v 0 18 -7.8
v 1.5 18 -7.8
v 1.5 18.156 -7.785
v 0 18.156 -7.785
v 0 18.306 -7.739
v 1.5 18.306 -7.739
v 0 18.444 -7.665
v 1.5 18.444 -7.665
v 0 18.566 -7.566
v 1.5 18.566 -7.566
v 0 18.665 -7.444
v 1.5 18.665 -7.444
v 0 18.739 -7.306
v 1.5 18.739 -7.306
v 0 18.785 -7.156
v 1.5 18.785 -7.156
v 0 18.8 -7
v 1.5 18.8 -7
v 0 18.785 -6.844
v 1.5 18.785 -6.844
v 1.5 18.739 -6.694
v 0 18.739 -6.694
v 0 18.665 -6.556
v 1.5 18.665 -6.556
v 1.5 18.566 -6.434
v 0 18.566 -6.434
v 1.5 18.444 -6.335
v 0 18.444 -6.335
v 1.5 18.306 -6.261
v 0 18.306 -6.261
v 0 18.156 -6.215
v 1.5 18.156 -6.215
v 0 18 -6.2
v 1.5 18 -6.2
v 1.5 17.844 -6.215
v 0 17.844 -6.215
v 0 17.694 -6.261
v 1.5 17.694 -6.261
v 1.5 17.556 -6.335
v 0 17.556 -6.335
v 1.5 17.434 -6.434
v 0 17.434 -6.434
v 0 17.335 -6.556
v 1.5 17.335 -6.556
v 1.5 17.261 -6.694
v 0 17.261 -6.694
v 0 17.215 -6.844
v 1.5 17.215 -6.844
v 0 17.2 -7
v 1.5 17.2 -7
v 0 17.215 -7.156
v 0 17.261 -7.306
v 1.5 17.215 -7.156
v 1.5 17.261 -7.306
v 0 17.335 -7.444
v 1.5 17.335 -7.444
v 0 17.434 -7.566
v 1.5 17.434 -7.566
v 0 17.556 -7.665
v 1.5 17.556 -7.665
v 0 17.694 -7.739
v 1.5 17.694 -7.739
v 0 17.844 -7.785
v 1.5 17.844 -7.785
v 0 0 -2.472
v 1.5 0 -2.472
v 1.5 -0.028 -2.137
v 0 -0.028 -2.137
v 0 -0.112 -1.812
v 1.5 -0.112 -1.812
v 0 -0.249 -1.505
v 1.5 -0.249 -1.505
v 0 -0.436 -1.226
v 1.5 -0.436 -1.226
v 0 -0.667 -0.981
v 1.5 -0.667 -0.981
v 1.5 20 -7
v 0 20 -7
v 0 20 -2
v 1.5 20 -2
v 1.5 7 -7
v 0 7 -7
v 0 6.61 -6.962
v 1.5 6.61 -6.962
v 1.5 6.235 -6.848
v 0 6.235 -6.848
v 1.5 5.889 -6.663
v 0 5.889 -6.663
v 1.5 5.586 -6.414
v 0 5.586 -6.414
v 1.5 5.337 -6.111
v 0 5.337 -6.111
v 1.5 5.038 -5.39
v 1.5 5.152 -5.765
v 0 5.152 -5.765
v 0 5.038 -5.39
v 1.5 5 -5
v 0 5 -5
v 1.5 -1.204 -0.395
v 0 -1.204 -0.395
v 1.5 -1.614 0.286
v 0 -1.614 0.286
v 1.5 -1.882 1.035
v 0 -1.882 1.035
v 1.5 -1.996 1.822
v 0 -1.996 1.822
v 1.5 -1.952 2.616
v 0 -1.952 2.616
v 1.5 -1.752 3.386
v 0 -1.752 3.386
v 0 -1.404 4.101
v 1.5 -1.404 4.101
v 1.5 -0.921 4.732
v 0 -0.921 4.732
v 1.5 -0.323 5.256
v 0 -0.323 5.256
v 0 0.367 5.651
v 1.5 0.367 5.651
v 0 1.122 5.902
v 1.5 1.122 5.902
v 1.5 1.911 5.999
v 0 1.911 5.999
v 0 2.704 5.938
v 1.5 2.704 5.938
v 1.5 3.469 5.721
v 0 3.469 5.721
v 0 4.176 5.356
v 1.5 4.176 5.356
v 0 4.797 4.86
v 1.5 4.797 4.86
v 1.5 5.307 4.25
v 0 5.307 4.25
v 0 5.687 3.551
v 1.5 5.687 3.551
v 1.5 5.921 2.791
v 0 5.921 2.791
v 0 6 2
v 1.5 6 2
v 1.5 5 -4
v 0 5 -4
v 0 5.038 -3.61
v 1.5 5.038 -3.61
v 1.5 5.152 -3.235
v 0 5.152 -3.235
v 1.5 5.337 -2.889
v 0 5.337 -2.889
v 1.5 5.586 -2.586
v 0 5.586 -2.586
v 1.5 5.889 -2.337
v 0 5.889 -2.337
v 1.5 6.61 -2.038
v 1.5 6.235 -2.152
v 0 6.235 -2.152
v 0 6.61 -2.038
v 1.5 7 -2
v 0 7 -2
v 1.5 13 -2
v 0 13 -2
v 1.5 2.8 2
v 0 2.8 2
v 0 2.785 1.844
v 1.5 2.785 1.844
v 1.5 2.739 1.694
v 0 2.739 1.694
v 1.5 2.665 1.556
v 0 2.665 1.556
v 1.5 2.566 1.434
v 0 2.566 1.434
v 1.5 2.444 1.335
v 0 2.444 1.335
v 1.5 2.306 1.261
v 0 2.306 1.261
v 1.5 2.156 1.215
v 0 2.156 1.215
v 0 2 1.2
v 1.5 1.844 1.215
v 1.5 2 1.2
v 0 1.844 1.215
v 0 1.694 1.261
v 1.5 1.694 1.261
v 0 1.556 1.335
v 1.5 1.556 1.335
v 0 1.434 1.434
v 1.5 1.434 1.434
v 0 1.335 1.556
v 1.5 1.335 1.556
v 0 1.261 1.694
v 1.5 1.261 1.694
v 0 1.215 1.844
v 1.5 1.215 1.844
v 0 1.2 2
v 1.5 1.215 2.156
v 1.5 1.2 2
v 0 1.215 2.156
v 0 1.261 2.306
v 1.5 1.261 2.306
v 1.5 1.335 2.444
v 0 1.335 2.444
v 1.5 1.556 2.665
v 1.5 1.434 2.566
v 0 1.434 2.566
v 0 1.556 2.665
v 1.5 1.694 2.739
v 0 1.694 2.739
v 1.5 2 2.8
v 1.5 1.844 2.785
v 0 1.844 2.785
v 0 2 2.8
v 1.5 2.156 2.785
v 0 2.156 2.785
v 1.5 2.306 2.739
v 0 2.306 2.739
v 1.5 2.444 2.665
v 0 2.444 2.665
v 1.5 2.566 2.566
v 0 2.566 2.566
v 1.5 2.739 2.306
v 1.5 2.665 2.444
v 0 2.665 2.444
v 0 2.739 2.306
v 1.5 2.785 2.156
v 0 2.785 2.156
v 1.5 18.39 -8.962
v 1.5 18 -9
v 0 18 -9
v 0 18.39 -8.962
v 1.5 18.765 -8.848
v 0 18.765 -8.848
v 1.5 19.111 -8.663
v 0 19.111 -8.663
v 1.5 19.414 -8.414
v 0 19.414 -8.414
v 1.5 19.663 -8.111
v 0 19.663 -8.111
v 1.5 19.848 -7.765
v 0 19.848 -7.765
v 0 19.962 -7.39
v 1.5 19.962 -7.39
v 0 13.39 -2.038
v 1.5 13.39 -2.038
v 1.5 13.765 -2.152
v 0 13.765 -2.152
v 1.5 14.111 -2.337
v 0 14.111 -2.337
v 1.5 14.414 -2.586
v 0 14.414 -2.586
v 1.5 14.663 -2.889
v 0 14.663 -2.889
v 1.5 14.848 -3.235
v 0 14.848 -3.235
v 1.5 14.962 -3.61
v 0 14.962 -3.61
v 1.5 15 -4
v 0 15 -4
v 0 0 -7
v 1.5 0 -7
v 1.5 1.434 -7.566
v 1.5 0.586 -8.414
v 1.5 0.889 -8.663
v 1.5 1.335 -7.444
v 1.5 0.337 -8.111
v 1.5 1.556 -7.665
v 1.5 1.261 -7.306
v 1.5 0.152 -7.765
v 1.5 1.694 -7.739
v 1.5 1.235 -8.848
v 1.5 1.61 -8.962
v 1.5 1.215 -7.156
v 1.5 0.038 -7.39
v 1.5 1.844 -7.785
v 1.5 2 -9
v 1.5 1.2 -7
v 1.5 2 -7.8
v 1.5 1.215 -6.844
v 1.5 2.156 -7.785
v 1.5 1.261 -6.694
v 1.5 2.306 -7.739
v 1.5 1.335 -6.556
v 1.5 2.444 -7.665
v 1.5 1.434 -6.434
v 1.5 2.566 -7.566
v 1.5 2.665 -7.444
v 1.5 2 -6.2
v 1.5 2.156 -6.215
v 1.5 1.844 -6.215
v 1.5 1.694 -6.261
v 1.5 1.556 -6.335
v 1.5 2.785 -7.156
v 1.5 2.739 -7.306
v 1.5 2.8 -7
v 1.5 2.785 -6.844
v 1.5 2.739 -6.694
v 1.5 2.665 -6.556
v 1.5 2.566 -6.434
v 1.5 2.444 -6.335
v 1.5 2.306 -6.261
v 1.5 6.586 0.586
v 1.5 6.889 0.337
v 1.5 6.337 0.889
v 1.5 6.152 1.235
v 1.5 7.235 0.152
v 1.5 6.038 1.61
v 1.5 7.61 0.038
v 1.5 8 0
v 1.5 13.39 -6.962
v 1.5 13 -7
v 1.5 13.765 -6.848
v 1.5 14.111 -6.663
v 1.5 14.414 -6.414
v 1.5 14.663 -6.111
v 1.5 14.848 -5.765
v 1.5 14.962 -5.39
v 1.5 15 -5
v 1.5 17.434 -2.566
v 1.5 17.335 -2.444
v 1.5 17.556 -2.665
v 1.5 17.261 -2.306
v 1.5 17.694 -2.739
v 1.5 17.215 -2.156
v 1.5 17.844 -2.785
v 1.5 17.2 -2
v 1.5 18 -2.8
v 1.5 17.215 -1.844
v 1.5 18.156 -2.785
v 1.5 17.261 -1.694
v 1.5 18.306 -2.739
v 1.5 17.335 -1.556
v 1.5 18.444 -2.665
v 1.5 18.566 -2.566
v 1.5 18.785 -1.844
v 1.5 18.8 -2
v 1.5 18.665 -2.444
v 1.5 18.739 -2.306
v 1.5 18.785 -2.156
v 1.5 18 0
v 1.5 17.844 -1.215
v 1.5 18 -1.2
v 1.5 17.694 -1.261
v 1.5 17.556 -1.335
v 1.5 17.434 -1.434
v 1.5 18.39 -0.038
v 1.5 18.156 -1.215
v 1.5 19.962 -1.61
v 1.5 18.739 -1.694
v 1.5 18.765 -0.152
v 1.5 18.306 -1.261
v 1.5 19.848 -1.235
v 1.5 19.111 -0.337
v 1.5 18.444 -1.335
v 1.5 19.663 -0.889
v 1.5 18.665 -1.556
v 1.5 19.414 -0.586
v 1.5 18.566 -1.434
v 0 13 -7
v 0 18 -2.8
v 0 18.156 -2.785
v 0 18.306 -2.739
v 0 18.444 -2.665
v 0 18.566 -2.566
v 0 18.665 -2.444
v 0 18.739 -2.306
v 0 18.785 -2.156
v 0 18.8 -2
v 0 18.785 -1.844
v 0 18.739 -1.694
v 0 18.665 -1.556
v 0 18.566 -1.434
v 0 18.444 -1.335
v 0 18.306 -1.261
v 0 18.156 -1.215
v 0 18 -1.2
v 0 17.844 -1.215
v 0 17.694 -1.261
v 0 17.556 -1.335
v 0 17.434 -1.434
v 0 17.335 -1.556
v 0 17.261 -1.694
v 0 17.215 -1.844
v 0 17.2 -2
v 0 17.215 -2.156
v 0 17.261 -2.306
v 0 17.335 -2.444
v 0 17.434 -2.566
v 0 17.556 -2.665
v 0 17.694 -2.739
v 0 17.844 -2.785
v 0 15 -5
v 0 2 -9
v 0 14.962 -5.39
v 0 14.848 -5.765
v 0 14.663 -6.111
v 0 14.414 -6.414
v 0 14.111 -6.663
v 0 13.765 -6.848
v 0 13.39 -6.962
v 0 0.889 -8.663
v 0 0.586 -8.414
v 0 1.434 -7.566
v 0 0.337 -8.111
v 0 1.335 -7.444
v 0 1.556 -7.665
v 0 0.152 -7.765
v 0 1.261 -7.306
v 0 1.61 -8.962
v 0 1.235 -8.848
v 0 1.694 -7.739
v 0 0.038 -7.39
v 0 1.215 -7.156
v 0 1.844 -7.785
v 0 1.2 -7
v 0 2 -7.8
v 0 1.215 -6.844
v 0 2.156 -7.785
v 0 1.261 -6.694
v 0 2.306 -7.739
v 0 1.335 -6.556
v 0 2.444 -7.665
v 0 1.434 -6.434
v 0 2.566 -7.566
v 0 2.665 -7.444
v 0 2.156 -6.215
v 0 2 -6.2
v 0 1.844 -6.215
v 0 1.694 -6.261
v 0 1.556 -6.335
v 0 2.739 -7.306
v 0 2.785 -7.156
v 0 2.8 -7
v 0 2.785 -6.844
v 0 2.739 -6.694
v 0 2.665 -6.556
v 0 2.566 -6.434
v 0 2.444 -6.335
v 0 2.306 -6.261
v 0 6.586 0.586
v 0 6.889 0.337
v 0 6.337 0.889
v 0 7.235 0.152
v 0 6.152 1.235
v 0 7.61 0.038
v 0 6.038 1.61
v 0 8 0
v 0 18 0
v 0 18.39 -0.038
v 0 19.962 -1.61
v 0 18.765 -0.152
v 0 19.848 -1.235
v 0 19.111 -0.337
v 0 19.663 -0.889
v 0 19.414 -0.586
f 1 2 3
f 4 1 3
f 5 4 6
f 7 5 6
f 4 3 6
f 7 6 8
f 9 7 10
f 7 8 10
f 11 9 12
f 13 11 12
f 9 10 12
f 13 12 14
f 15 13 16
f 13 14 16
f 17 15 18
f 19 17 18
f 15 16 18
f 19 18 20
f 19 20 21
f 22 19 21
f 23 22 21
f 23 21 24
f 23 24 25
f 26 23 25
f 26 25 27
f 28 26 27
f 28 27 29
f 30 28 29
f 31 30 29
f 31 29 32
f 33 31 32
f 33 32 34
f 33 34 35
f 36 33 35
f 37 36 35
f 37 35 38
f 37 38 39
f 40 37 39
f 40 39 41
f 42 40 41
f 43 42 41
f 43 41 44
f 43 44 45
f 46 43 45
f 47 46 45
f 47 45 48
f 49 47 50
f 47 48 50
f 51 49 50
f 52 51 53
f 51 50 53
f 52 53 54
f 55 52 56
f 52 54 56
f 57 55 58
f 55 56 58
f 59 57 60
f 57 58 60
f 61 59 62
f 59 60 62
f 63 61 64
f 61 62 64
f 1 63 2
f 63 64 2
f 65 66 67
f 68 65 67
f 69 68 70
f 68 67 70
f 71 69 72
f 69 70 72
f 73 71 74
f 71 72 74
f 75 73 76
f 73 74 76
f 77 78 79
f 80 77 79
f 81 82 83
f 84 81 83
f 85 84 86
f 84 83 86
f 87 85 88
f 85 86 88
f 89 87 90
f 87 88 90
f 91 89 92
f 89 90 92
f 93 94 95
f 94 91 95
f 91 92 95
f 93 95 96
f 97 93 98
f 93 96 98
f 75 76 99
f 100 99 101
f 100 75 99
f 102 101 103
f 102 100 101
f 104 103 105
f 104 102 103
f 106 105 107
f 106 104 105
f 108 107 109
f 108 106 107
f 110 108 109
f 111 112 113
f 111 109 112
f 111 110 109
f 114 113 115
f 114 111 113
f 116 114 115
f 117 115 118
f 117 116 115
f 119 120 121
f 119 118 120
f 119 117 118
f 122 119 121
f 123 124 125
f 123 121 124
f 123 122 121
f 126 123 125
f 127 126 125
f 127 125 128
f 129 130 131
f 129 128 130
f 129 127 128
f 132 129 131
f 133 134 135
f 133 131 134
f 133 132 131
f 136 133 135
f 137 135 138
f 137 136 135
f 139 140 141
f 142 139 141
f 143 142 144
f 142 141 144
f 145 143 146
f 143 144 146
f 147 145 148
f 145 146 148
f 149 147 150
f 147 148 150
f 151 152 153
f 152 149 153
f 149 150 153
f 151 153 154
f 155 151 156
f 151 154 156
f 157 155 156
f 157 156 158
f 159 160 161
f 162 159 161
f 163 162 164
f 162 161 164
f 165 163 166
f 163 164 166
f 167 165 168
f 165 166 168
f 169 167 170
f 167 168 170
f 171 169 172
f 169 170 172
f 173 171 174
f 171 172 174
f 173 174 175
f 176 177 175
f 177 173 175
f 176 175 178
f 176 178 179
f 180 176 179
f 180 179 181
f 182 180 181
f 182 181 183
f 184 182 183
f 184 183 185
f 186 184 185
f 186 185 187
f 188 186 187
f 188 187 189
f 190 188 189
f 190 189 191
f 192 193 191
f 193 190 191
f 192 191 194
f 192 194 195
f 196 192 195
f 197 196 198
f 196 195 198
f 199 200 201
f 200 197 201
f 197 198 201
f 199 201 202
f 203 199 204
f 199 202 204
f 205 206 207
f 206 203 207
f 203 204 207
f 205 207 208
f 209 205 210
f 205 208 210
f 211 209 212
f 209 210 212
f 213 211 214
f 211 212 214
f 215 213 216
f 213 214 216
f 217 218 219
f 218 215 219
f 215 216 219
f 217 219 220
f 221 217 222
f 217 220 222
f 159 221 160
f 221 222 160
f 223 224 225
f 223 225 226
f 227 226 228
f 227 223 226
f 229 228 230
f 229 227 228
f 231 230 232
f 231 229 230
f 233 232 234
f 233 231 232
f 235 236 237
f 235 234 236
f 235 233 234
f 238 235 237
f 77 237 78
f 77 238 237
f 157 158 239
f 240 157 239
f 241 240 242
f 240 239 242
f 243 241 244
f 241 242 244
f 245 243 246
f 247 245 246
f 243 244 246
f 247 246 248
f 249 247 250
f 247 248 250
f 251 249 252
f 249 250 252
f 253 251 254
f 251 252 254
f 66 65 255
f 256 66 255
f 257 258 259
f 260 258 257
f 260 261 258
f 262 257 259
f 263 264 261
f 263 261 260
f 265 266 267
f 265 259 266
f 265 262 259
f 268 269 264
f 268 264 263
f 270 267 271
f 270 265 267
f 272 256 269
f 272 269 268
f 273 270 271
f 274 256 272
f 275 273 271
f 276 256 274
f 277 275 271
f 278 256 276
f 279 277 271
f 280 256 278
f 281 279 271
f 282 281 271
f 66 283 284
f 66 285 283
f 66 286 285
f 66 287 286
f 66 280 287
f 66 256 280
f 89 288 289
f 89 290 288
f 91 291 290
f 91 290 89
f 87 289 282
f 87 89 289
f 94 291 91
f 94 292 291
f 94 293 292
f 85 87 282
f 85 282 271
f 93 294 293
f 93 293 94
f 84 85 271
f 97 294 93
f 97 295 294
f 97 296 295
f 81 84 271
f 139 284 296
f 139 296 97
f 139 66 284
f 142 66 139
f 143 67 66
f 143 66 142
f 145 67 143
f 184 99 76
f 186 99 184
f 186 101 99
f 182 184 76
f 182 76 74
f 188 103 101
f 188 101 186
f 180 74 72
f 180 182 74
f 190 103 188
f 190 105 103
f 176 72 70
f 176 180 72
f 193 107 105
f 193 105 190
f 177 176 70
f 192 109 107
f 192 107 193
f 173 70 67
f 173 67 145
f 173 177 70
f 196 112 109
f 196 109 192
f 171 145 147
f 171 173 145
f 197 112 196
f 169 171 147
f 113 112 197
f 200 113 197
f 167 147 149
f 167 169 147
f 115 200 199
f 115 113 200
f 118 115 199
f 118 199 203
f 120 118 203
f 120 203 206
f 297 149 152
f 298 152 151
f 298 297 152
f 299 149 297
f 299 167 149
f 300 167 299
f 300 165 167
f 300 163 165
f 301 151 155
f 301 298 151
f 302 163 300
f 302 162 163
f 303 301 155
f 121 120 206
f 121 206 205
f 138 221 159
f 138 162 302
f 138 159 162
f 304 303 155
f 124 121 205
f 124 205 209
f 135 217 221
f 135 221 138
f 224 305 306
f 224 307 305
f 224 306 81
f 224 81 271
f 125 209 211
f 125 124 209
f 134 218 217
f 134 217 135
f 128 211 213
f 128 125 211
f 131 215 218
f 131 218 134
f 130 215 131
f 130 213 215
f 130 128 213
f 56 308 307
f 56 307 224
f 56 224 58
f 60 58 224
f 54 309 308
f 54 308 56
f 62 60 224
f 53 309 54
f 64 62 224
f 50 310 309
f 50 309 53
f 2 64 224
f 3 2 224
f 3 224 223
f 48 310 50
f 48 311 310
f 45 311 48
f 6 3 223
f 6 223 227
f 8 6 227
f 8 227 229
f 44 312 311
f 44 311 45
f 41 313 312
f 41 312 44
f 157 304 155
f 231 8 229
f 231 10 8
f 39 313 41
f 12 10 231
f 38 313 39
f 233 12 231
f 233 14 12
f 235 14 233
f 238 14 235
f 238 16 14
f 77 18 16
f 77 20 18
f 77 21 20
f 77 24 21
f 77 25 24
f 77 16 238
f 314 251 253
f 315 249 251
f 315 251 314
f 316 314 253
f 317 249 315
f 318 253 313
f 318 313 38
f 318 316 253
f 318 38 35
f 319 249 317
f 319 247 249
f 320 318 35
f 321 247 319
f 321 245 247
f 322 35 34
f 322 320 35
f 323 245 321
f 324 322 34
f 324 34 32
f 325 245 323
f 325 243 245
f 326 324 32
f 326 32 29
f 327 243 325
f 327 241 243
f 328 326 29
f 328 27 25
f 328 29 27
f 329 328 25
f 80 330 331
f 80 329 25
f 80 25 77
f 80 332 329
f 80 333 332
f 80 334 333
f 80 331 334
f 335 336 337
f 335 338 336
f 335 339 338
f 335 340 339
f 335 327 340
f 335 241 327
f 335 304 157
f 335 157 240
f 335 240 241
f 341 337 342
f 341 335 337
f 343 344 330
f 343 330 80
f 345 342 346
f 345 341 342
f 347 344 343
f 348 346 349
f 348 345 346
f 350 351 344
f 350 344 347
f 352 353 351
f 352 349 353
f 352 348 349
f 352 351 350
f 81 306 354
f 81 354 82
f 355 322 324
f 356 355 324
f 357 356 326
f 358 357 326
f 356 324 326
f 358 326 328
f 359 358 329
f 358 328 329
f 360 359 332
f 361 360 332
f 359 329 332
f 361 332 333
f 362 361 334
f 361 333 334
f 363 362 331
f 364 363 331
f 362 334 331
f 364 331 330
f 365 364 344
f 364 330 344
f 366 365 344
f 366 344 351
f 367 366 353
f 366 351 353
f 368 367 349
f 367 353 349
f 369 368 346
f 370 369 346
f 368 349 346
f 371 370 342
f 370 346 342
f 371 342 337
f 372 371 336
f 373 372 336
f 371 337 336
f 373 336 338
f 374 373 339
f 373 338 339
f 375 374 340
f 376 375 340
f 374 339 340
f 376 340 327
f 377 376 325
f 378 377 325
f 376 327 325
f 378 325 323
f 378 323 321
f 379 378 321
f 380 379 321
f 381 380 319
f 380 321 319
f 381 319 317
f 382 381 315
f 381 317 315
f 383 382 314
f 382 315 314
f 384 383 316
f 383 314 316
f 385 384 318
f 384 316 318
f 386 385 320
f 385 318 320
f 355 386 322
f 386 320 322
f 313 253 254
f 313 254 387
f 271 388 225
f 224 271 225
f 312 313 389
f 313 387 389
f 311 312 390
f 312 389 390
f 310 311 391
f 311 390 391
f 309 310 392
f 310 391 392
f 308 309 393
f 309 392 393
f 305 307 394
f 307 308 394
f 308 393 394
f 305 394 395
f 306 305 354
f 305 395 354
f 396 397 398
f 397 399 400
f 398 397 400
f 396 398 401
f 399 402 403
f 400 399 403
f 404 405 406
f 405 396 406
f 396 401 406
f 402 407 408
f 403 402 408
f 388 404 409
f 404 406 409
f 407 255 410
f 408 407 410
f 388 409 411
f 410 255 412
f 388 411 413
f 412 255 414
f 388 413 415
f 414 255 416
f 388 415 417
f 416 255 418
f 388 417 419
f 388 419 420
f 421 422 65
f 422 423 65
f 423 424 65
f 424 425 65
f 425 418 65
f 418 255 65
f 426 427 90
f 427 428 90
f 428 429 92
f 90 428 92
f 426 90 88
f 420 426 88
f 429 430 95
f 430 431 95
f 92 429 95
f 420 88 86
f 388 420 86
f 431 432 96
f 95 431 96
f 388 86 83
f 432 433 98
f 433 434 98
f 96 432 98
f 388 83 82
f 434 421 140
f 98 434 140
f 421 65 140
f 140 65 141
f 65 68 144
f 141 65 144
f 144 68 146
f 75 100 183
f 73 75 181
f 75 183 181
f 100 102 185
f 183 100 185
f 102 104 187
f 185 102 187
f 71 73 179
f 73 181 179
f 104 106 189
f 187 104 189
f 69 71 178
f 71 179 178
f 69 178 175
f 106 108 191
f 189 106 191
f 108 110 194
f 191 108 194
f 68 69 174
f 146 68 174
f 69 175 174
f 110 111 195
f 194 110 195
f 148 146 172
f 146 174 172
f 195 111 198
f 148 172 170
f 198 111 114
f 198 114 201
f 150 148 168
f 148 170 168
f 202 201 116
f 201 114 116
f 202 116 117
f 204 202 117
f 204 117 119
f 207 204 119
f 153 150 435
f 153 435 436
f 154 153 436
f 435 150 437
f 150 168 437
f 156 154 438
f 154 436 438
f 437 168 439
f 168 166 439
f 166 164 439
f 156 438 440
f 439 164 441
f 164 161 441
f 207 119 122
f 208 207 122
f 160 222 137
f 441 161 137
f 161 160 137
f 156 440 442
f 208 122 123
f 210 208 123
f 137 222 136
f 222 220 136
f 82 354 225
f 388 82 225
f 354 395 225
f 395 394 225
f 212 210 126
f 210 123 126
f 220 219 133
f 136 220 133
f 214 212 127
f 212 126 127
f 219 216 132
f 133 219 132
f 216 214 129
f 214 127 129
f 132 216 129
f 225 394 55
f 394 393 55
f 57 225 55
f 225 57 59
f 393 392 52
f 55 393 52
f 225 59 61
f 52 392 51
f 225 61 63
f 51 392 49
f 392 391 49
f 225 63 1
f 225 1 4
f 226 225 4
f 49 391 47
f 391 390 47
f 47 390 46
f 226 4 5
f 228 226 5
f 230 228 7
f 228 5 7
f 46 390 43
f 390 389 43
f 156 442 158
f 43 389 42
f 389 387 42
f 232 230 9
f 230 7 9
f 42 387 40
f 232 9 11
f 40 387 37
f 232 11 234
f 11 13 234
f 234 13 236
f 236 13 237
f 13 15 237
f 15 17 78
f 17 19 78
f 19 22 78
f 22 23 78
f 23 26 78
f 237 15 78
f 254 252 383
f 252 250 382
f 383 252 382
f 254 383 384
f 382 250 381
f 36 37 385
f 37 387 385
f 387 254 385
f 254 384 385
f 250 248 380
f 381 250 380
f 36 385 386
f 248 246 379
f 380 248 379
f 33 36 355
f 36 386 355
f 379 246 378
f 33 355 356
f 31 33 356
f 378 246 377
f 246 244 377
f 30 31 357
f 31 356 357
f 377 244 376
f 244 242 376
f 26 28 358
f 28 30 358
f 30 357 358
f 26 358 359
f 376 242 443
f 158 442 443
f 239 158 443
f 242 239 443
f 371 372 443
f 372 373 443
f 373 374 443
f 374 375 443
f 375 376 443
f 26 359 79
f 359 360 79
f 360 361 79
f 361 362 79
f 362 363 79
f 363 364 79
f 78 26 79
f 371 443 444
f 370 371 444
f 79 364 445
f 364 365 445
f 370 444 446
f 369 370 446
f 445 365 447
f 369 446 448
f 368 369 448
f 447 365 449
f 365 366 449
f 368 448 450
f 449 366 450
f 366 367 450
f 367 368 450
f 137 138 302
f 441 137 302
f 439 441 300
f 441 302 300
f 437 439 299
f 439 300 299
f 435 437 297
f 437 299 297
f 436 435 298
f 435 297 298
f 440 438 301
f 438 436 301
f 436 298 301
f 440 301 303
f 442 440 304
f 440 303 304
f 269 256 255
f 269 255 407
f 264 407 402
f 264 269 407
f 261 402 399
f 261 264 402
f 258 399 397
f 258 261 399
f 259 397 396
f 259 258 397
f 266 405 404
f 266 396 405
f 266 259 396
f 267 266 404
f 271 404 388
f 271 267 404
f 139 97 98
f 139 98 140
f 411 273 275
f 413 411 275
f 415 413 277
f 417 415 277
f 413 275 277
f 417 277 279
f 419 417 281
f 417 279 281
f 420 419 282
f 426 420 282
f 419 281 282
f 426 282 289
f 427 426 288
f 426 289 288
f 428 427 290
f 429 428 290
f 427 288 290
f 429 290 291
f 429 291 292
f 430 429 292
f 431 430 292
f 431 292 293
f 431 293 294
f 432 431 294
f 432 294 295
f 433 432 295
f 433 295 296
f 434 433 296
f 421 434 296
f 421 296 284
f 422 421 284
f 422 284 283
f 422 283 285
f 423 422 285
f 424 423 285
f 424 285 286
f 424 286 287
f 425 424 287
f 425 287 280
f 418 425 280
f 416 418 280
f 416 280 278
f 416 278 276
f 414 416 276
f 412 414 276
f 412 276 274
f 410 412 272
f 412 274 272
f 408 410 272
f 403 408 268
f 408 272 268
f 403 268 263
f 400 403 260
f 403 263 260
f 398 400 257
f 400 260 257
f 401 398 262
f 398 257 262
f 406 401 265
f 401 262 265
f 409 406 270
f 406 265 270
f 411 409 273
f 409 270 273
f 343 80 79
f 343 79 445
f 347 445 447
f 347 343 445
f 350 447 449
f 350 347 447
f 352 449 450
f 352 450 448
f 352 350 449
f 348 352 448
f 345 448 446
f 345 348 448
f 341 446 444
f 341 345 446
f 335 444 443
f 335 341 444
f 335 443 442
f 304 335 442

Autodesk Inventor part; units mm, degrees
ref_plane "YZ Plane" through (0, 0, 0) normal (1, 0, 0) x (0, 1, 0)
ref_plane "XZ Plane" through (0, 0, 0) normal (0, 1, 0) x (-1, 0, 0)
ref_plane "XY Plane" through (0, 0, 0) normal (0, 0, 1) x (1, 0, 0)
sketch "スケッチ1" plane through (0, 0, 0) normal (1, 0, 0) x (0, 1, 0)
  line L0 (20, 0) -> (0, 0)
  line L1 (0, 0) -> (0, -9)
  line L2 (0, -9) -> (20, -9)
  line L3 (20, -9) -> (20, 0)
  circle A0 centre (2, 2) radius 2
  circle A1 centre (2, 2) radius 0.8
  line L4 (4, 4) -> (0, 4)
  line L5 (0, 4) -> (0, 0)
  line L6 (0, 0) -> (4, 0)
  line L7 (4, 0) -> (4, 4)
  circle A2 centre (2, 2) radius 4
  point P0 (4, 2)
  point P1 (0, 2)
  point P2 (5.4641, 0)
  point P3 (0, -1.4641)
  dimension "d0" = 4
  dimension "d1" = 1.6
  dimension "d2" = 9
  dimension "d3" = 20
  dimension "d12" = 8
extrude "押し出し1" add sketch "スケッチ1" along normal blind 1.5
fillet "フィレット1" radius 2 5 edges at (0.75, 20, 0) (0.75, 20, -9) (0.75, 0, -9) (0.75, 0, -1.4641) (0.75, 5.4641, 0)
sketch "スケッチ2" plane through (1.5, 0, 0) normal (1, 0, 0) x (0, 0, -1)
  circle A0 centre (2, 18) radius 0.8
  circle A1 centre (7, 18) radius 0.8
  circle A2 centre (7, 2) radius 0.8
  arc A3 (9, 18) -> (7, 20) centre (7, 18) ccw projected
  arc A4 (2, 20) -> (0, 18) centre (2, 18) ccw projected
  arc A5 (7, 0) -> (9, 2) centre (7, 2) ccw projected
  line L0 (2, 18) -> (7, 18) construction
  line L1 (7, 18) -> (7, 2) construction
  line L2 (7, 2) -> (2, 2) construction
  line L3 (2, 2) -> (2, 18) construction
  line L4 (2, 15) -> (7, 15)
  line L5 (7, 15) -> (7, 5)
  line L6 (7, 5) -> (2, 5)
  line L7 (2, 5) -> (2, 15)
  point P0 (0, 0)
  dimension "d6" = 1.6
  dimension "d7" = 1.6
  dimension "d8" = 1.6
  dimension "d13" = 3
  dimension "d14" = 3
extrude "押し出し2" cut sketch "スケッチ2" against normal through all
fillet "フィレット2" radius 2 4 edges at (0.75, 15, -2) (0.75, 15, -7) (0.75, 5, -7) (0.75, 5, -2)
properties part number "chest_cover_side_joint"
